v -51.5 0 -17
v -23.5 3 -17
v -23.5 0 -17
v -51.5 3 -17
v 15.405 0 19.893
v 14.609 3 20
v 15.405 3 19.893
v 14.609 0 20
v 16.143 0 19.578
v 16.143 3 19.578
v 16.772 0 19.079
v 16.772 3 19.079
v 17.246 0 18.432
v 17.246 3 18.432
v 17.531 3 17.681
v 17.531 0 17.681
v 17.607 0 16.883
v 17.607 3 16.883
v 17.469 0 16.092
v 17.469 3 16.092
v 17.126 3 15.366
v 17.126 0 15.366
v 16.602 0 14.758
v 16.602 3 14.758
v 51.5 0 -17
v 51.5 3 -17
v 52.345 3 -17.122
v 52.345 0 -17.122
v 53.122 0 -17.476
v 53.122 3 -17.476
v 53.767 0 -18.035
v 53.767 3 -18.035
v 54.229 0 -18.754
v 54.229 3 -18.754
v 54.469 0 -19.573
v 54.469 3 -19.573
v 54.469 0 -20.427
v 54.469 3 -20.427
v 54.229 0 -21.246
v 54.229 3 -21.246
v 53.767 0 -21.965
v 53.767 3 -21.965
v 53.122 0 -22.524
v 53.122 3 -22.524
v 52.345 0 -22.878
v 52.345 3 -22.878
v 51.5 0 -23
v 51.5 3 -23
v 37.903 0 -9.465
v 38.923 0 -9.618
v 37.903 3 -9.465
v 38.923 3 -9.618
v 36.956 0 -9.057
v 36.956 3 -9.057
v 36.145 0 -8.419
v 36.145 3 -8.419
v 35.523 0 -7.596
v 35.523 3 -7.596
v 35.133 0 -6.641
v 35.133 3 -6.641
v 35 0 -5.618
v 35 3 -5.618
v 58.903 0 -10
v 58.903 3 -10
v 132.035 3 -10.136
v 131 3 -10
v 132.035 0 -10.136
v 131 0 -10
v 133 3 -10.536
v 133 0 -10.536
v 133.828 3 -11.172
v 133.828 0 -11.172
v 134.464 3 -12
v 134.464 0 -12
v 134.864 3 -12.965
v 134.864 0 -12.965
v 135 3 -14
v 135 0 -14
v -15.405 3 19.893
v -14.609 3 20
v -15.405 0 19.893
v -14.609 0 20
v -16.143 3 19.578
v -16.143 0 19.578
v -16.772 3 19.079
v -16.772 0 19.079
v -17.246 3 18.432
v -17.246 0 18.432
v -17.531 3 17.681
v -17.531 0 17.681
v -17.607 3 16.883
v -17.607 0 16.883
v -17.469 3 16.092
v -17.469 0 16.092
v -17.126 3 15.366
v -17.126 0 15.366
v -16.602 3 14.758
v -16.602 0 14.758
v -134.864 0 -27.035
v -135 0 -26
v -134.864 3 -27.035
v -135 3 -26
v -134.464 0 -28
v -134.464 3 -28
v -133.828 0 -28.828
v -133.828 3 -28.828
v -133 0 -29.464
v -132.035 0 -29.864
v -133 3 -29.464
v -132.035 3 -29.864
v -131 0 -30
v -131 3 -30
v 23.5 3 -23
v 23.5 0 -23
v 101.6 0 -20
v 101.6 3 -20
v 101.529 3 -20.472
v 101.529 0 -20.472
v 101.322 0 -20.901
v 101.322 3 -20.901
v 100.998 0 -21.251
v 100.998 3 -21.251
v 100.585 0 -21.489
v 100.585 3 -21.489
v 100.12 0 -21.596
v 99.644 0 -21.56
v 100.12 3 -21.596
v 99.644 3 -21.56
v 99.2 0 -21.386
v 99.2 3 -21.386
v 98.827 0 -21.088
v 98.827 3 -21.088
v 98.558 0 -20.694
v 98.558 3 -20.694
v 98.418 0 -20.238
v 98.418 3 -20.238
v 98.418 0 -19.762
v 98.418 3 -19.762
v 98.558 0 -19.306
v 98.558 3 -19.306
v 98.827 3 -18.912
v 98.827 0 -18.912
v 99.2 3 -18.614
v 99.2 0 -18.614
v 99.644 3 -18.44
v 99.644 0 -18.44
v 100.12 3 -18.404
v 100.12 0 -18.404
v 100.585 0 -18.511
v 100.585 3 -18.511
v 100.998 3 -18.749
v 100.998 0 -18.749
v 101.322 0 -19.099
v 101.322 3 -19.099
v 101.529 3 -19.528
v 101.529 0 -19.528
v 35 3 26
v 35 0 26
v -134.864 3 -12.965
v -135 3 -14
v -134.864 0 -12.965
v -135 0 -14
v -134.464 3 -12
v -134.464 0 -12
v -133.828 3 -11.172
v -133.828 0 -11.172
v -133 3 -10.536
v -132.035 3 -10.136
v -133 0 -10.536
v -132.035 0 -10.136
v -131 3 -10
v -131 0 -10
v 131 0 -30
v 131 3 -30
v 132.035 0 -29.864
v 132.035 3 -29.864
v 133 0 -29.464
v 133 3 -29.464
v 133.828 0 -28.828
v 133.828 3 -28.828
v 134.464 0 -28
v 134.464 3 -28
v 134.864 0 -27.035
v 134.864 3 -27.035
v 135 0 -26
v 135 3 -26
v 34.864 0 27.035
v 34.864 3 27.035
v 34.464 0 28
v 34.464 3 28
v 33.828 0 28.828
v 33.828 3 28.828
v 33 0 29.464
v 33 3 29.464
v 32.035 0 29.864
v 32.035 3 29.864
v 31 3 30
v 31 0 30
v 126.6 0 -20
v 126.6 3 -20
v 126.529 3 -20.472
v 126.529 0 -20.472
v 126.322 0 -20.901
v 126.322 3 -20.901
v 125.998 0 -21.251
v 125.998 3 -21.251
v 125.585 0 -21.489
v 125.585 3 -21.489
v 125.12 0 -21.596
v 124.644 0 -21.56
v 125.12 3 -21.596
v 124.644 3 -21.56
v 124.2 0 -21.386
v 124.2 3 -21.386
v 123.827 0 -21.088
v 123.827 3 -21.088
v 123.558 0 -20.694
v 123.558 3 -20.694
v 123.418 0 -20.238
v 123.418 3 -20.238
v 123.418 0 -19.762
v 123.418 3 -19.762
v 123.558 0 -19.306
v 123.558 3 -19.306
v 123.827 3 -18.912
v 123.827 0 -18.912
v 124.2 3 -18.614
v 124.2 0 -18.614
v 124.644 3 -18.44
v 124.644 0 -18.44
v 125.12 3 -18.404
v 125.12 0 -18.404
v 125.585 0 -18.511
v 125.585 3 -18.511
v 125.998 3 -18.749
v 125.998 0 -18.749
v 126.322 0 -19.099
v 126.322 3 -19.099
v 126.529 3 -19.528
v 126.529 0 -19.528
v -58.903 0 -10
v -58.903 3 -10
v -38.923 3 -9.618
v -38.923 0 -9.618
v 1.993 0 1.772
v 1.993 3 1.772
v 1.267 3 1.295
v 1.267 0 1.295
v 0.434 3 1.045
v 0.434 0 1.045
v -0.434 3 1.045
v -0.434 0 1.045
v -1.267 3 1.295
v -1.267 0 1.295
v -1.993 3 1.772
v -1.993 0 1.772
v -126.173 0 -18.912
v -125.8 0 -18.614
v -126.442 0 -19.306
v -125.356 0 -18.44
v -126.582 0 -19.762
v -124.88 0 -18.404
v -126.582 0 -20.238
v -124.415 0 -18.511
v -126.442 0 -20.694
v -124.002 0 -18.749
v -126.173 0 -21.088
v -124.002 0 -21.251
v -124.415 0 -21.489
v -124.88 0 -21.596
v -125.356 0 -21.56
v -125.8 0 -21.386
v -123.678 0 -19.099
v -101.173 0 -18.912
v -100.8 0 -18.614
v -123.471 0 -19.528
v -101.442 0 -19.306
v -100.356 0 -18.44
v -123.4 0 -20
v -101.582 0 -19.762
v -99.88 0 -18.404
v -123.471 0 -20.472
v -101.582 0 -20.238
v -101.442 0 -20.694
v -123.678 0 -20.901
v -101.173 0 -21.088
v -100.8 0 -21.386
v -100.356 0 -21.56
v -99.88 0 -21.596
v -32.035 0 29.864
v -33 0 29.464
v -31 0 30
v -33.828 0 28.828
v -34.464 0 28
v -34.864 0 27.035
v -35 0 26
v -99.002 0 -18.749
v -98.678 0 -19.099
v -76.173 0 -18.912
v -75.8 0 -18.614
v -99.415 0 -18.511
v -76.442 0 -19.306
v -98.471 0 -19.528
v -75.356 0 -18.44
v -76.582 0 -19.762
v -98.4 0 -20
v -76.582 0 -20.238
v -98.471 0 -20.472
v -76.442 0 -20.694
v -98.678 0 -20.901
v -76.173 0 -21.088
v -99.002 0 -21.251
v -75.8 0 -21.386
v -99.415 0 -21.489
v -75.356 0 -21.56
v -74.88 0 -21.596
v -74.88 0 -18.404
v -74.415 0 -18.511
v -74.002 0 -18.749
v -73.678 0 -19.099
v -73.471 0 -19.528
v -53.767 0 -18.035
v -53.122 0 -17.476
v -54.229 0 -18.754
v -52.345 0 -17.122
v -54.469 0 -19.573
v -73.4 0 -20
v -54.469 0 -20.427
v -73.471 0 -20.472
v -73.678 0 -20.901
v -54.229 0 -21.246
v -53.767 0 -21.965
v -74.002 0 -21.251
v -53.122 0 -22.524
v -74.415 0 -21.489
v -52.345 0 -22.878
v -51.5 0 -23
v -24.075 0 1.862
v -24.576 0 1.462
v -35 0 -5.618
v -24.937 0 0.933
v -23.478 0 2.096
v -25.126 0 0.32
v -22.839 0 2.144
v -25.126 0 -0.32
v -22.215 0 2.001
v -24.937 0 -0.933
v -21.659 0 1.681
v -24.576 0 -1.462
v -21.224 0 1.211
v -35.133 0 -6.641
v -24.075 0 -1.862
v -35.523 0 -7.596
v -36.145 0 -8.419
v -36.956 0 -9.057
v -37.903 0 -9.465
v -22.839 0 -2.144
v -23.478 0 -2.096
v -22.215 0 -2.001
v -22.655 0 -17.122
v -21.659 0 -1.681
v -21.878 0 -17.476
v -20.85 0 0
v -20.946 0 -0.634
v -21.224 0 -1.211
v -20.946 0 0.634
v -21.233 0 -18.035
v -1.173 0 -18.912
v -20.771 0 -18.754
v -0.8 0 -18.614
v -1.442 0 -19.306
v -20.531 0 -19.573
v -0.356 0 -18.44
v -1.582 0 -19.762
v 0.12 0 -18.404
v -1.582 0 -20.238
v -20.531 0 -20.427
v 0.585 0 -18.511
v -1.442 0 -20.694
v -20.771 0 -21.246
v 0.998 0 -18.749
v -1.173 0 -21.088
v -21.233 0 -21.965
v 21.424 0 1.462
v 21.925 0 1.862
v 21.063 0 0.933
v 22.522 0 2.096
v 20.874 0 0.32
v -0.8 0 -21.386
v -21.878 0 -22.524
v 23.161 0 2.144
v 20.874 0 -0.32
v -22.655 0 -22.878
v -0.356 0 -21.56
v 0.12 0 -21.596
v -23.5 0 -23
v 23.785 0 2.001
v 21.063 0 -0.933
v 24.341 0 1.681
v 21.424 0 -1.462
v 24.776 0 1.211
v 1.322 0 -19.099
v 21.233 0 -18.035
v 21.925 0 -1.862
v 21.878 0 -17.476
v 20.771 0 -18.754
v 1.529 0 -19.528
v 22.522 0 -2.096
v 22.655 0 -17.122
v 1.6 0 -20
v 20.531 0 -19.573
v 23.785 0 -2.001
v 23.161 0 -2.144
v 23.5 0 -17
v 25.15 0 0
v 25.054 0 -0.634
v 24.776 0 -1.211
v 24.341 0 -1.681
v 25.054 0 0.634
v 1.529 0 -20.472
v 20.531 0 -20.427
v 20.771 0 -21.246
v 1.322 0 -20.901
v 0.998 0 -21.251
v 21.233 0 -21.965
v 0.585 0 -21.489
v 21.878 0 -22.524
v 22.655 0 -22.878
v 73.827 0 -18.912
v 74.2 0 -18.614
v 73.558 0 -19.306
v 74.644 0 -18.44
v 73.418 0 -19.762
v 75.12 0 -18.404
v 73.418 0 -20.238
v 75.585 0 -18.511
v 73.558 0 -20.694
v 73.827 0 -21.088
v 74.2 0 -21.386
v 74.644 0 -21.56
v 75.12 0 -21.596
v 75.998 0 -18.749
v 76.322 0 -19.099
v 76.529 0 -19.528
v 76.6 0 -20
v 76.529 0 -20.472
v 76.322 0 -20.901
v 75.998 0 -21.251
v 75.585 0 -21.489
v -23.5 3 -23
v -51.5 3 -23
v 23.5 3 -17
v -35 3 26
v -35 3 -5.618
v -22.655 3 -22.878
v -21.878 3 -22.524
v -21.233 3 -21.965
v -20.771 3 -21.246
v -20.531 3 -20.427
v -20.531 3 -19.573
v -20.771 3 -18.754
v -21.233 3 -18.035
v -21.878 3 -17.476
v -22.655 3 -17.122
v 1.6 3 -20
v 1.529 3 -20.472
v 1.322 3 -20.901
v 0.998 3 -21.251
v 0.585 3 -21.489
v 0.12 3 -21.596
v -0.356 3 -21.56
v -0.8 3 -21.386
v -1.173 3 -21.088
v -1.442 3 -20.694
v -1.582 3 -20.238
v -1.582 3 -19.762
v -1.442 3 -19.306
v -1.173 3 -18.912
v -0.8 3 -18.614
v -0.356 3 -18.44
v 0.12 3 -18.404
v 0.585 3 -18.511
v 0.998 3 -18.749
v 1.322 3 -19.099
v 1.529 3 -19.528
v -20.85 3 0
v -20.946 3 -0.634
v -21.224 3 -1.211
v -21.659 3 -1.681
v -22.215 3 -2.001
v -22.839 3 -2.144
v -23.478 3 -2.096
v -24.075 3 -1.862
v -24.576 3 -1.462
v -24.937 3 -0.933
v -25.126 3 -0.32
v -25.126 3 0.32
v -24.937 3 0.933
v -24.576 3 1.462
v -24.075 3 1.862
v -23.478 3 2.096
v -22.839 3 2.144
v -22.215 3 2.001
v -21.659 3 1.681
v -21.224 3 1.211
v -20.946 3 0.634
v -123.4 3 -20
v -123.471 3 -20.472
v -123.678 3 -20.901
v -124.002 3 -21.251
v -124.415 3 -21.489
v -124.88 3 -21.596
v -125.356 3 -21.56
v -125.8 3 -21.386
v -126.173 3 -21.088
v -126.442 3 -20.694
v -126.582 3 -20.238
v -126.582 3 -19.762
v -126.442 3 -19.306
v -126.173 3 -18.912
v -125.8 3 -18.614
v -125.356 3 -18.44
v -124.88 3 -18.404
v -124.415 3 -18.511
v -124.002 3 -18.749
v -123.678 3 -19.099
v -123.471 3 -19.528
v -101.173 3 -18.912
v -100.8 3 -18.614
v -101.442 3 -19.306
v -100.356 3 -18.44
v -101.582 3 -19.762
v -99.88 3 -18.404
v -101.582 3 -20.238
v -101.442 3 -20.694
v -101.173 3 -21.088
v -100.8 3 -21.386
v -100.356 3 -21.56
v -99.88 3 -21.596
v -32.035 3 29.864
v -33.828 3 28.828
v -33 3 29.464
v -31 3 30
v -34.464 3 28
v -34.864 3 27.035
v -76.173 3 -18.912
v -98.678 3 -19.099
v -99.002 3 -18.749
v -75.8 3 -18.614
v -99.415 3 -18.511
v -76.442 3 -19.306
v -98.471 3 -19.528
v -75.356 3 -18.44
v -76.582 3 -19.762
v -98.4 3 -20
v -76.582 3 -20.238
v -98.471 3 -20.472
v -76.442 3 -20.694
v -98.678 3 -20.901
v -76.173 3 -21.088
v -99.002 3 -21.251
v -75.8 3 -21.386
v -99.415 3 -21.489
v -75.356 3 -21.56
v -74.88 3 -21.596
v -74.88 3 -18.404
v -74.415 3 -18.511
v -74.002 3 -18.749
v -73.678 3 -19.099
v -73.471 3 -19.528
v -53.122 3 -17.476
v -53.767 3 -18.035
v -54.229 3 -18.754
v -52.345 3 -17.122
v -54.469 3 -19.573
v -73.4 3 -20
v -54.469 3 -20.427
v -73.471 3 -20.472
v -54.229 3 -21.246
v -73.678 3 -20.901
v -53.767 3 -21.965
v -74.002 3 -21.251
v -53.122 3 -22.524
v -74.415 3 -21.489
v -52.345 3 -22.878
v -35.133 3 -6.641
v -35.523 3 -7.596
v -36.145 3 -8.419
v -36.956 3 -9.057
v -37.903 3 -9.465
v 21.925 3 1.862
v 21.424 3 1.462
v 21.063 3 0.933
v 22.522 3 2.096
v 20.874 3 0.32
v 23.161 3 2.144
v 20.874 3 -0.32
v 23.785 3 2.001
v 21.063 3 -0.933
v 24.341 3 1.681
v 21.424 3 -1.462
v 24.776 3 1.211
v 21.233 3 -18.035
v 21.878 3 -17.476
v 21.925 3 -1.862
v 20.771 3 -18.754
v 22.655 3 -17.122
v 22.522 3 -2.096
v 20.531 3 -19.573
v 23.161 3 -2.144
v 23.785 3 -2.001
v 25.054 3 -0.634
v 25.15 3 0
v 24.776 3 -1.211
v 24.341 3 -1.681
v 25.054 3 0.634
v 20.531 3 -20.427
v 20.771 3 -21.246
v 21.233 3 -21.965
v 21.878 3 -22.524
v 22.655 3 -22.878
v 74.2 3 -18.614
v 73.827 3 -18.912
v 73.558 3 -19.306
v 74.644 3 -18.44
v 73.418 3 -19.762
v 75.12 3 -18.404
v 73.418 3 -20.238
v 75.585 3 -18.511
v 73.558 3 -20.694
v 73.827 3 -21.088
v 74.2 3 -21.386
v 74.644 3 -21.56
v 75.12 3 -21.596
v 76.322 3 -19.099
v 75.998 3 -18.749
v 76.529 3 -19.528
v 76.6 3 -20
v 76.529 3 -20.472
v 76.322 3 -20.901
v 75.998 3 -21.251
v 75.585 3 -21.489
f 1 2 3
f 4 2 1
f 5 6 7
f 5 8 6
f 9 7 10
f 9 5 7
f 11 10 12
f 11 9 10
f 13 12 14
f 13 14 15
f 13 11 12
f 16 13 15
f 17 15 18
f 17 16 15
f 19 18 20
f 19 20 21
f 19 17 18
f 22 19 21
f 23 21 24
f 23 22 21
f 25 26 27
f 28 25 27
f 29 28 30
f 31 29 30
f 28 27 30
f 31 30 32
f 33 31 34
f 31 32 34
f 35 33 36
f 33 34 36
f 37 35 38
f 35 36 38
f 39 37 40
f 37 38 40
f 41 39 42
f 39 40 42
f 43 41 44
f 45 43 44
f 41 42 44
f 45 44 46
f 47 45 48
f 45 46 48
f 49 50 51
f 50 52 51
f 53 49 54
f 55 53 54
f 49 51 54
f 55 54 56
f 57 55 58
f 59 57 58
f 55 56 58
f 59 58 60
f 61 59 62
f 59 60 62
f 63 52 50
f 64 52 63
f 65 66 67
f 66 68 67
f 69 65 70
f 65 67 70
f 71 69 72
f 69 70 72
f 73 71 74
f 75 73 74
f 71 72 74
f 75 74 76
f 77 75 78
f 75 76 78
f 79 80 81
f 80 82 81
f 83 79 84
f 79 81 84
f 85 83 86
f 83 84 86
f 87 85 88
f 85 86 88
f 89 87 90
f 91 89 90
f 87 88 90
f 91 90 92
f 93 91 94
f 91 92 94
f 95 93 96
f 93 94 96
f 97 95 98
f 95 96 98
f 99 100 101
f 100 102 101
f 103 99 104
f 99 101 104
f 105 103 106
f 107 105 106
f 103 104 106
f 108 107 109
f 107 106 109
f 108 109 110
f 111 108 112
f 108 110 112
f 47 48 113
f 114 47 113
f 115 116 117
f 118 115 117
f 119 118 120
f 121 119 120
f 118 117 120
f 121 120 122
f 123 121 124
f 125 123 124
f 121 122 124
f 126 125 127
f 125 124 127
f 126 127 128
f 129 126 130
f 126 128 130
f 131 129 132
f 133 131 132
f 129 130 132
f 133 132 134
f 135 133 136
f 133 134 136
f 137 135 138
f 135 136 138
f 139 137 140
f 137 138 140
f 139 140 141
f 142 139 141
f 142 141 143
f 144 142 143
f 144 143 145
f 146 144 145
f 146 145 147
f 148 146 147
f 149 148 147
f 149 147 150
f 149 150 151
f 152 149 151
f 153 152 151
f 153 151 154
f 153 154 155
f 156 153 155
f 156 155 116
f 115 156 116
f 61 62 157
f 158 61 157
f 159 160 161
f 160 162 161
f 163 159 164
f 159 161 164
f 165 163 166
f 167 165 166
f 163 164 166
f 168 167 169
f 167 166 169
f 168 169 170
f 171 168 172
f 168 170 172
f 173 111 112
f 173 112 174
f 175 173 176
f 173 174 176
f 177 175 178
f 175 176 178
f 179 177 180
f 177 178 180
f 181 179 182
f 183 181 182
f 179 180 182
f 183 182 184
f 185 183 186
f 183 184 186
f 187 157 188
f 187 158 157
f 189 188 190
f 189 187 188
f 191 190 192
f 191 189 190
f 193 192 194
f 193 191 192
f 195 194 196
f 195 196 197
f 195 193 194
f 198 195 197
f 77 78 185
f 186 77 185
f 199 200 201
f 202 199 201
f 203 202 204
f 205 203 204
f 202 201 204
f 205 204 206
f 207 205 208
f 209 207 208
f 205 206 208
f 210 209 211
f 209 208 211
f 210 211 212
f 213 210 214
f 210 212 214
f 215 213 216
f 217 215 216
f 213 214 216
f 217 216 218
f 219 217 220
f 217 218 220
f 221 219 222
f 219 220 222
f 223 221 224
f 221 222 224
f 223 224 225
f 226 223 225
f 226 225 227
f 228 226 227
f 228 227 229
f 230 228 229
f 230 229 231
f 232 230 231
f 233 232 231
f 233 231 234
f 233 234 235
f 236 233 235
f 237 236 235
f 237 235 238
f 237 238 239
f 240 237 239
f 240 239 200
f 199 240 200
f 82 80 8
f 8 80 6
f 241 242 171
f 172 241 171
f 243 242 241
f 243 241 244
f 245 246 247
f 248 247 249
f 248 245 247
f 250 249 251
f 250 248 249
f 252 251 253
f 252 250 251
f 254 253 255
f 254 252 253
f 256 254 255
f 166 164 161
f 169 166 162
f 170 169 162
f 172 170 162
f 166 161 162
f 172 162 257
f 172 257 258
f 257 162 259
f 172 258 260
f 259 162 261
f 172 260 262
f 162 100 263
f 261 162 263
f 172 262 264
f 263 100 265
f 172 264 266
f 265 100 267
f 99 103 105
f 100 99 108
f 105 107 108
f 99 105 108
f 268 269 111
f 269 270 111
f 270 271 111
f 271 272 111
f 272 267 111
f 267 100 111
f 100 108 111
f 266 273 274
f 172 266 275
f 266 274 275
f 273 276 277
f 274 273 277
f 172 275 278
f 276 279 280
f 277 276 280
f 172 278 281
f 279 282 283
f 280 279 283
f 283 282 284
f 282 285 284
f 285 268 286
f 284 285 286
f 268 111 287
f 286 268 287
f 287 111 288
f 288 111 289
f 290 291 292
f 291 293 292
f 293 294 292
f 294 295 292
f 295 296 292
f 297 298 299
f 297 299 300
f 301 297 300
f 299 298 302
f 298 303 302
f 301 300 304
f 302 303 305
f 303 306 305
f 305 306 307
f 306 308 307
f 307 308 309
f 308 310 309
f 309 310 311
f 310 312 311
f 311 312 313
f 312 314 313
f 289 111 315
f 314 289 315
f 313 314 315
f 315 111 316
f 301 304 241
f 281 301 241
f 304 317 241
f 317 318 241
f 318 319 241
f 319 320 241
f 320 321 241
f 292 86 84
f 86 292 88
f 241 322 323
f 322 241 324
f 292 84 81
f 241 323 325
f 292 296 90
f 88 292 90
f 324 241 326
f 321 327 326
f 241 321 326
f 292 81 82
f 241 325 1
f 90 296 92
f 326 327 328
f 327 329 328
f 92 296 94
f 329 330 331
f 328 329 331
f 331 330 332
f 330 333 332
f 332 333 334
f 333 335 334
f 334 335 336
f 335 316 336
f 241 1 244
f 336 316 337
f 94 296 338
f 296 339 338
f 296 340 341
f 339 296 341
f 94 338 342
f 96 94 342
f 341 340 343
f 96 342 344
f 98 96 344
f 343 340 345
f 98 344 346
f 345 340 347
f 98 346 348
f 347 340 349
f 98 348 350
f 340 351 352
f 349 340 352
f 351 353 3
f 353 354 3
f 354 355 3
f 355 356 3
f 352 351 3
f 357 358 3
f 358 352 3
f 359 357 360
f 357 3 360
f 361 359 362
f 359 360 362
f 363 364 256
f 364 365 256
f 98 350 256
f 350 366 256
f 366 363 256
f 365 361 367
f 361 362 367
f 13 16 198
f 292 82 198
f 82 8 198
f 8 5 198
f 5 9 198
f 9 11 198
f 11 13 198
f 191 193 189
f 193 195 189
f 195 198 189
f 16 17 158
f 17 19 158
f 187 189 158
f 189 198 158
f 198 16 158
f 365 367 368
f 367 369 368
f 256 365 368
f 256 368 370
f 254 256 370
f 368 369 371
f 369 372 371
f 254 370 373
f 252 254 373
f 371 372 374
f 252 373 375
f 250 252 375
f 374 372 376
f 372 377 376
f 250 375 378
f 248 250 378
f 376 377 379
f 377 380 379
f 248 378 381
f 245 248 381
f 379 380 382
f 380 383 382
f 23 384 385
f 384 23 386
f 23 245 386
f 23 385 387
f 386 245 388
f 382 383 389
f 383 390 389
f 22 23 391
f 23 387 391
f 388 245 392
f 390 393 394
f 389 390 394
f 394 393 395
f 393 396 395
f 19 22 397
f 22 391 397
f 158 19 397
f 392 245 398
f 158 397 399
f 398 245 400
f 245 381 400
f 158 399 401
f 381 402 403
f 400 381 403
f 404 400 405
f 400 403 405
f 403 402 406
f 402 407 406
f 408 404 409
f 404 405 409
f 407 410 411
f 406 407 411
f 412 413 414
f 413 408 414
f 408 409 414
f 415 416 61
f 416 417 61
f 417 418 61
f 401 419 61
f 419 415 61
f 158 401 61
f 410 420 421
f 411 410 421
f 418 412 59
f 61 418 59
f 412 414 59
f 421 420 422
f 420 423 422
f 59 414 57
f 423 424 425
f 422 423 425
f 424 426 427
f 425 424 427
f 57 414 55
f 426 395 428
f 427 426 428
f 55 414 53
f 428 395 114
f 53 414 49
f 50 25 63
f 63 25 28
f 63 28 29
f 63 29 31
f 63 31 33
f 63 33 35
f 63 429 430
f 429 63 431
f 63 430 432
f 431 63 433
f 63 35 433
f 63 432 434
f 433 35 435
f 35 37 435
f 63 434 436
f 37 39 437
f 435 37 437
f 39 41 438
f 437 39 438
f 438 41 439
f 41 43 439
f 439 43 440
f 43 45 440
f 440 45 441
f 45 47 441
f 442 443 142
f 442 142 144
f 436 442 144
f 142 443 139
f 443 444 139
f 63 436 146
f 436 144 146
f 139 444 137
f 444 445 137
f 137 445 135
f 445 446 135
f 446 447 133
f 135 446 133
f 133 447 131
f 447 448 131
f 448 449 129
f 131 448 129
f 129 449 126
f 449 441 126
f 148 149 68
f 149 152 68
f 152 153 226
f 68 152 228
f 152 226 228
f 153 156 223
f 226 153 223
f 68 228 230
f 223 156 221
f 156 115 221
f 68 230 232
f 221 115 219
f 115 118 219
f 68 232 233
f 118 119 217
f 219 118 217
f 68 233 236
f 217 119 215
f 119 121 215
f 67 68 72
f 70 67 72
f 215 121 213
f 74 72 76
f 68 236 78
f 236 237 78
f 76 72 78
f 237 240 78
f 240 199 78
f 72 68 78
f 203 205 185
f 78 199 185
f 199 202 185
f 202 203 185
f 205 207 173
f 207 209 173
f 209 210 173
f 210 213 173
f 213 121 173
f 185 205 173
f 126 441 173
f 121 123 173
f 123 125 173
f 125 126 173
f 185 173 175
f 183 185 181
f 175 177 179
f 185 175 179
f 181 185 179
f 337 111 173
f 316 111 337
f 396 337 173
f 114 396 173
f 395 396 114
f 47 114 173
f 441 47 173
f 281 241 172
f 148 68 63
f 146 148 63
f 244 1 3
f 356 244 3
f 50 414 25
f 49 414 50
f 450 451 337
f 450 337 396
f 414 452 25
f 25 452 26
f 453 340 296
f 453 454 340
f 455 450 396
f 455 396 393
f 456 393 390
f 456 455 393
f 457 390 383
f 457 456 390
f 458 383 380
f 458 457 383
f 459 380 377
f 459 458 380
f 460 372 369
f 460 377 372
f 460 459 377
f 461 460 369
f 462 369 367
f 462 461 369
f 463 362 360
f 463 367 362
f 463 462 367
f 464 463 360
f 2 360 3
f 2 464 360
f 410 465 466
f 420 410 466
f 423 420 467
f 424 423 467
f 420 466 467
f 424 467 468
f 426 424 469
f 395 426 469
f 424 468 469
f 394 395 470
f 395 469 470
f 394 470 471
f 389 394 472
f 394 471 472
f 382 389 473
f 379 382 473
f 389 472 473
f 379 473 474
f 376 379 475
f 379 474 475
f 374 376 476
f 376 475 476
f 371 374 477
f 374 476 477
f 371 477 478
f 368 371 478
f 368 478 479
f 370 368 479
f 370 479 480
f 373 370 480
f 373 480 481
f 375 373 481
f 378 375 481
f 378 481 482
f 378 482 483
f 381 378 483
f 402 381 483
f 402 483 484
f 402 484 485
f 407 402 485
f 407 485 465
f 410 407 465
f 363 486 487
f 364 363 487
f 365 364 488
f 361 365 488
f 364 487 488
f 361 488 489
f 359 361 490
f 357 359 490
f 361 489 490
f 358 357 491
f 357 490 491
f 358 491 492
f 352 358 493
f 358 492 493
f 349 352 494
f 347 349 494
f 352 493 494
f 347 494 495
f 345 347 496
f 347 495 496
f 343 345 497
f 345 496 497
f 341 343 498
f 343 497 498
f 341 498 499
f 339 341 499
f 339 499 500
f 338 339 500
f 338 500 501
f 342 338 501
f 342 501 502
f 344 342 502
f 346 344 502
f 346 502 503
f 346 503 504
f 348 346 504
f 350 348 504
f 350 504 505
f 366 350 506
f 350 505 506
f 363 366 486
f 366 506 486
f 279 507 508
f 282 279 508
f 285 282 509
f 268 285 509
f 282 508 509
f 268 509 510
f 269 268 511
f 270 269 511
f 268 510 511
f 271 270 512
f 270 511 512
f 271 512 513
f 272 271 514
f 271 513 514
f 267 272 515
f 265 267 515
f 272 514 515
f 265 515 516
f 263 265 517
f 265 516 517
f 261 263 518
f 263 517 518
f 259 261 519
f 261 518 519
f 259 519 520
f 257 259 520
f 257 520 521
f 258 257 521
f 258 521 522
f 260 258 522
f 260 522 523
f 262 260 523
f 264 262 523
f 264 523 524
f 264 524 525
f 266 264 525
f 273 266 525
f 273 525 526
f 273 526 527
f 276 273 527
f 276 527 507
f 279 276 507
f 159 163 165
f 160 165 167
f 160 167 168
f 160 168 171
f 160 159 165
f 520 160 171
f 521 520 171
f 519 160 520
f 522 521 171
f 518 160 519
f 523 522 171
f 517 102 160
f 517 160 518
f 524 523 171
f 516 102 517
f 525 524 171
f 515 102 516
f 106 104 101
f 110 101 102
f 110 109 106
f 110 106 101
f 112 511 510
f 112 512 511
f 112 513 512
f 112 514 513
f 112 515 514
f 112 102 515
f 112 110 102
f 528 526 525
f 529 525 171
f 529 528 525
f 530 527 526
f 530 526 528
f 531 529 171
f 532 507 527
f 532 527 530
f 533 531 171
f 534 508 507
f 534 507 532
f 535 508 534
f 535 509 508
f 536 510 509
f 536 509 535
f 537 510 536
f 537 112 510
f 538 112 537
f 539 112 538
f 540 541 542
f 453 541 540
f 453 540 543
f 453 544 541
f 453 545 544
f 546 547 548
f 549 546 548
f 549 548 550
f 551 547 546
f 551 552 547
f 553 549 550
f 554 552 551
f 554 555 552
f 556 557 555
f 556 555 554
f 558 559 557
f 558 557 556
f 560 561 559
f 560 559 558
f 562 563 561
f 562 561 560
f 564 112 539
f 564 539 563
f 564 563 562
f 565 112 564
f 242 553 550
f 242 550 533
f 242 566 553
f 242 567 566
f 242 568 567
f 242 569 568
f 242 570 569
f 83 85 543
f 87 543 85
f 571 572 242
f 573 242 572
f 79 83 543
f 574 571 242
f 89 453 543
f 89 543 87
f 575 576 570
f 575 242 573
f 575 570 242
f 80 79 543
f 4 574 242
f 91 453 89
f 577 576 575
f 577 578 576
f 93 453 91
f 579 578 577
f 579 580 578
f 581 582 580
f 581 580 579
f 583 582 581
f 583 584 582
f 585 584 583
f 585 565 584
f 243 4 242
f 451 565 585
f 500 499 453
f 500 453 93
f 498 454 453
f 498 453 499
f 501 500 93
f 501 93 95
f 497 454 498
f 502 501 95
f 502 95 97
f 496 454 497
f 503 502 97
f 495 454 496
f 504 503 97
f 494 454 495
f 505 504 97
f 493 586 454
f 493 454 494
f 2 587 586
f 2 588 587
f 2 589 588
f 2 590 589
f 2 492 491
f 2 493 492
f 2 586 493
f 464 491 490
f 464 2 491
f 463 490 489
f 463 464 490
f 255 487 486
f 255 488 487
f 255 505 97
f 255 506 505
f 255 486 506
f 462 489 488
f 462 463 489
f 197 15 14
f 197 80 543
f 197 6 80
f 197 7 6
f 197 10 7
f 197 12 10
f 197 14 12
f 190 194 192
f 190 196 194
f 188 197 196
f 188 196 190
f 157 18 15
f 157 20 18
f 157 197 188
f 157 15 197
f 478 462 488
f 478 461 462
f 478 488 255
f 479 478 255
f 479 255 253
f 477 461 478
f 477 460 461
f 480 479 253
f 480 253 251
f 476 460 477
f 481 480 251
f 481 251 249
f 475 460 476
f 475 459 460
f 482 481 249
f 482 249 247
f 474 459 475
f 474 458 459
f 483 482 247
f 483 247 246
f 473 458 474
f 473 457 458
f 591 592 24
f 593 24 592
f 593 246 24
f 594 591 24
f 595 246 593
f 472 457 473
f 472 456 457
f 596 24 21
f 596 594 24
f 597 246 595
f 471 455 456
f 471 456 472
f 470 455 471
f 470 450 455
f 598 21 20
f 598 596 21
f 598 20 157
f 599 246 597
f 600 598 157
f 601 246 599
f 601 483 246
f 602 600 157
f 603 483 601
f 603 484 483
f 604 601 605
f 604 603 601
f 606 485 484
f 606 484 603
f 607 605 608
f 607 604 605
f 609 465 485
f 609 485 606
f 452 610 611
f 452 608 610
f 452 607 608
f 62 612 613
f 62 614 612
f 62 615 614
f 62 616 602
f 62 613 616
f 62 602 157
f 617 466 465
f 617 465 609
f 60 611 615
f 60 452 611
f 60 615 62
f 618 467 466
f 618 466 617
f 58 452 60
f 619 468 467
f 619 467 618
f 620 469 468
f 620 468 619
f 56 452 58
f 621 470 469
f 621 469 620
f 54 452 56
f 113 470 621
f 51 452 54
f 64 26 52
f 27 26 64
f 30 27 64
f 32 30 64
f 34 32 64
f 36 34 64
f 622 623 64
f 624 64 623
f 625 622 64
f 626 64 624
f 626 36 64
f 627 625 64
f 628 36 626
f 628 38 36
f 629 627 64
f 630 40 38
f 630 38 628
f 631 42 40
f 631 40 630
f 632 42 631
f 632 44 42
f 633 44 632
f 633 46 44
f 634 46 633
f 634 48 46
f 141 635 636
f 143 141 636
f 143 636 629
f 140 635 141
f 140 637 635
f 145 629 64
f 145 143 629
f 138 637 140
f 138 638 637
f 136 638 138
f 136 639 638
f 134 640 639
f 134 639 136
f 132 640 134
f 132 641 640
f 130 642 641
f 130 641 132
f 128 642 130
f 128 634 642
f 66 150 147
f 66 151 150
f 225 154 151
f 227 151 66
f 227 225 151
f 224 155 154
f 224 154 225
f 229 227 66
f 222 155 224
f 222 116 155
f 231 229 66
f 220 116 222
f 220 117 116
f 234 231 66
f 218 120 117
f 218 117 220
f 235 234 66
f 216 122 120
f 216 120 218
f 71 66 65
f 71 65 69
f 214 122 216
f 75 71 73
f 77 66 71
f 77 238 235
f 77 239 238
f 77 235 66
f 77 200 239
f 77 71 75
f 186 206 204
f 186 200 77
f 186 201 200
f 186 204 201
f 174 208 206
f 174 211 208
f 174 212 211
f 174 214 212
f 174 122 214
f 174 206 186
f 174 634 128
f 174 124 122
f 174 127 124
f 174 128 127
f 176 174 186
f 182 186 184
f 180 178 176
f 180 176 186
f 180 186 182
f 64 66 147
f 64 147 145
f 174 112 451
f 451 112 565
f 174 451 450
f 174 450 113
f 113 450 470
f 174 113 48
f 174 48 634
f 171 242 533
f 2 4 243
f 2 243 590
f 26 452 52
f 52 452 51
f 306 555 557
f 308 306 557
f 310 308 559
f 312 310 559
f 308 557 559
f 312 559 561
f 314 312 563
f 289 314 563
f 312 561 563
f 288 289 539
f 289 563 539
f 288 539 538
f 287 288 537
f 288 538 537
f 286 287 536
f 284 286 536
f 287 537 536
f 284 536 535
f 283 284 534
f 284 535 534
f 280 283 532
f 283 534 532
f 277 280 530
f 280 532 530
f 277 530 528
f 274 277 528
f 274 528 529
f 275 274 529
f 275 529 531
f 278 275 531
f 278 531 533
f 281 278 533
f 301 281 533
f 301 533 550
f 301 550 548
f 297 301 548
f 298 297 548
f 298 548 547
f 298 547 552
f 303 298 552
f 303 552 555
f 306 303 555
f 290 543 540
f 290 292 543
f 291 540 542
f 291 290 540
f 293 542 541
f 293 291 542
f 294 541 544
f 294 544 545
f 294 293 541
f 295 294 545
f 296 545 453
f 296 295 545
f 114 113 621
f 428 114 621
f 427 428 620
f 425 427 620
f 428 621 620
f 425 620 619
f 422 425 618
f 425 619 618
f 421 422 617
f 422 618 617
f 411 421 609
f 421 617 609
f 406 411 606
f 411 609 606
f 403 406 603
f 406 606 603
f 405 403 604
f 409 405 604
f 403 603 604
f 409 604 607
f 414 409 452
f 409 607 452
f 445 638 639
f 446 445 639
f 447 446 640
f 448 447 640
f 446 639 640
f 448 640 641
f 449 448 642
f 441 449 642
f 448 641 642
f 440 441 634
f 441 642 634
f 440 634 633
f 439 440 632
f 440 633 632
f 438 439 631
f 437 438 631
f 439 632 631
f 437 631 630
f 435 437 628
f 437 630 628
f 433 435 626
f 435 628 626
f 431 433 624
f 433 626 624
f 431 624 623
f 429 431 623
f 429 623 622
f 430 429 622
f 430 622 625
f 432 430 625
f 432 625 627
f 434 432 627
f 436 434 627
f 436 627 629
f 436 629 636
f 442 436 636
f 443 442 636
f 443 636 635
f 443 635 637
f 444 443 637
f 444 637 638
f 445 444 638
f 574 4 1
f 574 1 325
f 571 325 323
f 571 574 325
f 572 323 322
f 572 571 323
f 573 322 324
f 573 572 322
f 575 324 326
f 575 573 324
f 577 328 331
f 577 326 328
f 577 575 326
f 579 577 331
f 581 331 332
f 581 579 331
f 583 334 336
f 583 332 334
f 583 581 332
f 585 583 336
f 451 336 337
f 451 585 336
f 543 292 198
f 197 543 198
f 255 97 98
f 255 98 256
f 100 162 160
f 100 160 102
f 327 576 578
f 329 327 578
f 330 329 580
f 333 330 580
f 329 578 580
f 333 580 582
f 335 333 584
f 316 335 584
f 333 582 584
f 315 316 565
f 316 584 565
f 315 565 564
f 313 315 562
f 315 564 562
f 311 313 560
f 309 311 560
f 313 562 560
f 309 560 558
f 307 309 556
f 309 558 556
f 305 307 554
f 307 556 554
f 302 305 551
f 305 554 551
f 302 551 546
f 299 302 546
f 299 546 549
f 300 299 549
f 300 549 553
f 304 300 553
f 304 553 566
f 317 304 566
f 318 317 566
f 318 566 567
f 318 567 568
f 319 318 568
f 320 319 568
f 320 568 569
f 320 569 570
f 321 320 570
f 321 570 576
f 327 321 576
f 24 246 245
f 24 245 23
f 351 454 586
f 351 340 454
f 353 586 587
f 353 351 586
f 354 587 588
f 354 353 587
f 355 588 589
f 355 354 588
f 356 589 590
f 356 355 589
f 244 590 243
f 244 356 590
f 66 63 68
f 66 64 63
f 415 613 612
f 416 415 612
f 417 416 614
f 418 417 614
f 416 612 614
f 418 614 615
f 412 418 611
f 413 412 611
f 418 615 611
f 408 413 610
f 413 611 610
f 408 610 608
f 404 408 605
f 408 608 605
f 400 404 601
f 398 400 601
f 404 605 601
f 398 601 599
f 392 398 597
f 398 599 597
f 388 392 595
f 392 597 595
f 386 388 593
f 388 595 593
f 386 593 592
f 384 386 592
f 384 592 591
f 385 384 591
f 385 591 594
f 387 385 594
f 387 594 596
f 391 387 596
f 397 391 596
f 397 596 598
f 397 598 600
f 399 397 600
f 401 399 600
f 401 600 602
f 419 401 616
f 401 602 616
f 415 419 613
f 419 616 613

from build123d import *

# Parameters (mm, degrees)
SKETCH_1_W          = 270
SKETCH_1_H          = 60
EXTRUDE_1_DEPTH     = 3
SKETCH_2_R          = 2.15
SKETCH_2_R_2        = 1.6
CUT_EXTRUDE_1_DEPTH = 3
SKETCH_3_R          = 1.6
CUT_EXTRUDE_2_DEPTH = 10
CUT_EXTRUDE_3_DEPTH = 10
FILLET_1_R          = 3
FILLET_2_R          = 4
SKETCH_5_W          = 100
SKETCH_5_H          = 40
CUT_EXTRUDE_4_DEPTH = 10
EXTRUDE_2_DEPTH     = 3
EXTRUDE_9_DEPTH     = 3
EXTRUDE_10_DEPTH    = 3
EXTRUDE_11_DEPTH    = 3
EXTRUDE_13_DEPTH    = 3
EXTRUDE_14_DEPTH    = 3
EXTRUDE_16_DEPTH    = 3
EXTRUDE_17_DEPTH    = 3
EXTRUDE_18_DEPTH    = 3
EXTRUDE_19_DEPTH    = 3
CUT_EXTRUDE_5_DEPTH = 4
FILLET_4_R          = 4


with BuildPart() as part:
    # 草图1 → 凸台-拉伸1 (new body)
    with BuildSketch(Plane(origin=(0, 0, 0), x_dir=(1, 0, 0), z_dir=(0, 1, 0))):
        Rectangle(SKETCH_1_W, SKETCH_1_H)
    extrude(amount=EXTRUDE_1_DEPTH)

    # 草图2 → 切除-拉伸1 (cut)
    with BuildSketch(Plane(origin=(0, 3, 0), x_dir=(1, 0, 0), z_dir=(0, 1, 0))):
        with Locations((-23, 0)):
            Circle(SKETCH_2_R)
        with Locations((23, 0)):
            Circle(SKETCH_2_R)
        with Locations((-125, -20)):
            Circle(SKETCH_2_R_2)
        with Locations((-125, -60)):
            Circle(SKETCH_2_R_2)
        with Locations((125, -60)):
            Circle(SKETCH_2_R_2)
        with Locations((125, -20)):
            Circle(SKETCH_2_R_2)
    extrude(amount=-CUT_EXTRUDE_1_DEPTH, mode=Mode.SUBTRACT)

    # 草图3 → 切除-拉伸2 (cut)
    with BuildSketch(Plane(origin=(0, 3, 0), x_dir=(1, 0, 0), z_dir=(0, 1, 0))):
        with Locations((125, 20)):
            Circle(SKETCH_3_R)
        with Locations((100, 20)):
            Circle(SKETCH_3_R)
        with Locations((75, 20)):
            Circle(SKETCH_3_R)
        with Locations((0, 20)):
            Circle(SKETCH_3_R)
        with Locations((-75, 20)):
            Circle(SKETCH_3_R)
        with Locations((-100, 20)):
            Circle(SKETCH_3_R)
        with Locations((-125, 20)):
            Circle(SKETCH_3_R)
    extrude(amount=-CUT_EXTRUDE_2_DEPTH, mode=Mode.SUBTRACT)

    # 草图4 → 切除-拉伸3 (cut)
    with BuildSketch(Plane(origin=(0, 3, 0), x_dir=(1, 0, 0), z_dir=(0, 1, 0))):
        with BuildLine():
            Line((-112.832473586, 10.419213325), (-112.99590583, 10.347711719))
            ThreePointArc((-112.99590583, 10.347711719), (-119.580786675, 12.924404223), (-117.00409417, 19.509285068))
            Line((-117.00409417, 19.509285068), (-116.840661926, 19.580786675))
            ThreePointArc((-116.840661926, 19.580786675), (-110.255781081, 17.00409417), (-112.832473586, 10.419213325))
        make_face()
        with BuildLine():
            Line((-79.771332565, 7.419213325), (-112.99590583, -7.116537478))
            ThreePointArc((-112.99590583, -7.116537478), (-119.580786675, -4.539844974), (-117.00409417, 2.045035871))
            Line((-117.00409417, 2.045035871), (-83.779520905, 16.580786675))
            ThreePointArc((-83.779520905, 16.580786675), (-77.194640061, 14.00409417), (-79.771332565, 7.419213325))
        make_face()
        with BuildLine():
            Line((-32.99590583, 10.419213325), (-112.99590583, -24.580786675))
            ThreePointArc((-112.99590583, -24.580786675), (-119.580786675, -22.00409417), (-117.00409417, -15.419213325))
            Line((-117.00409417, -15.419213325), (-37.00409417, 19.580786675))
            ThreePointArc((-37.00409417, 19.580786675), (-30.419213325, 17.00409417), (-32.99590583, 10.419213325))
        make_face()
        with BuildLine():
            Line((-32.99590583, -10.045035871), (-66.220479095, -24.580786675))
            ThreePointArc((-66.220479095, -24.580786675), (-72.805359939, -22.00409417), (-70.228667435, -15.419213325))
            Line((-70.228667435, -15.419213325), (-37.00409417, -0.883462522))
            ThreePointArc((-37.00409417, -0.883462522), (-30.419213325, -3.460155026), (-32.99590583, -10.045035871))
        make_face()
        with BuildLine():
            Line((-32.99590583, -24.509285068), (-33.159338074, -24.580786675))
            ThreePointArc((-33.159338074, -24.580786675), (-39.744218919, -22.00409417), (-37.167526414, -15.419213325))
            Line((-37.167526414, -15.419213325), (-37.00409417, -15.347711719))
            ThreePointArc((-37.00409417, -15.347711719), (-30.419213325, -17.924404223), (-32.99590583, -24.509285068))
        make_face()
        with BuildLine():
            Line((32.99590583, -24.509285068), (33.159338074, -24.580786675))
            ThreePointArc((33.159338074, -24.580786675), (39.744218919, -22.00409417), (37.167526414, -15.419213325))
            Line((37.167526414, -15.419213325), (37.00409417, -15.347711719))
            ThreePointArc((37.00409417, -15.347711719), (30.419213325, -17.924404223), (32.99590583, -24.509285068))
        make_face()
        with BuildLine():
            Line((32.99590583, -10.045035871), (66.220479095, -24.580786675))
            ThreePointArc((66.220479095, -24.580786675), (72.805359939, -22.00409417), (70.228667435, -15.419213325))
            Line((70.228667435, -15.419213325), (37.00409417, -0.883462522))
            ThreePointArc((37.00409417, -0.883462522), (30.419213325, -3.460155026), (32.99590583, -10.045035871))
        make_face()
        with BuildLine():
            Line((32.99590583, 10.419213325), (112.99590583, -24.580786675))
            ThreePointArc((112.99590583, -24.580786675), (119.580786675, -22.00409417), (117.00409417, -15.419213325))
            Line((117.00409417, -15.419213325), (37.00409417, 19.580786675))
            ThreePointArc((37.00409417, 19.580786675), (30.419213325, 17.00409417), (32.99590583, 10.419213325))
        make_face()
        with BuildLine():
            Line((79.771332565, 7.419213325), (112.99590583, -7.116537478))
            ThreePointArc((112.99590583, -7.116537478), (119.580786675, -4.539844974), (117.00409417, 2.045035871))
            Line((117.00409417, 2.045035871), (83.779520905, 16.580786675))
            ThreePointArc((83.779520905, 16.580786675), (77.194640061, 14.00409417), (79.771332565, 7.419213325))
        make_face()
        with BuildLine():
            Line((112.832473586, 10.419213325), (112.99590583, 10.347711719))
            ThreePointArc((112.99590583, 10.347711719), (119.580786675, 12.924404223), (117.00409417, 19.509285068))
            Line((117.00409417, 19.509285068), (116.840661926, 19.580786675))
            ThreePointArc((116.840661926, 19.580786675), (110.255781081, 17.00409417), (112.832473586, 10.419213325))
        make_face()
        Polygon((0, -20), (-22.5, -20), (0, 0), (22.5, -20), align=None)
    extrude(amount=-CUT_EXTRUDE_3_DEPTH, mode=Mode.SUBTRACT)

    # 圆角1
    fillet_1_edges = [part.edges().sort_by_distance(p)[0] for p in [
        (22.5, 1.5, 20),
        (-22.5, 1.5, 20),
        (0, 1.5, 0),
    ]]
    fillet(fillet_1_edges, radius=FILLET_1_R)

    # 圆角2
    fillet_2_edges = [part.edges().sort_by_distance(p)[0] for p in [
        (135, 1.5, 30),
        (-135, 1.5, 30),
        (-135, 1.5, -30),
        (135, 1.5, -30),
    ]]
    fillet(fillet_2_edges, radius=FILLET_2_R)

    # 草图5 → 切除-拉伸4 (cut)
    with BuildSketch(Plane(origin=(0, 3, 0), x_dir=(1, 0, 0), z_dir=(0, 1, 0))):
        with Locations((-85, -10)):
            Rectangle(SKETCH_5_W, SKETCH_5_H)
        with Locations((85, -10)):
            Rectangle(SKETCH_5_W, SKETCH_5_H)
    extrude(amount=-CUT_EXTRUDE_4_DEPTH, mode=Mode.SUBTRACT)

    # 草图6 → 凸台-拉伸2 (add)
    with BuildSketch(Plane(origin=(0, 3, 0), x_dir=(1, 0, 0), z_dir=(0, 1, 0))):
        with BuildLine():
            Line((-111.519942965, 10), (-118.153192546, 10))
            ThreePointArc((-118.153192546, 10), (-114.836567756, 21), (-111.519942965, 10))
        make_face()
    extrude(amount=-EXTRUDE_2_DEPTH)

    # 草图7 → 凸台-拉伸9 (add)
    with BuildSketch(Plane(origin=(0, 3, 0), x_dir=(1, 0, 0), z_dir=(0, 1, 0))):
        with BuildLine():
            Line((-98.821319018, 10), (-83.779520905, 16.580786675))
            ThreePointArc((-83.779520905, 16.580786675), (-78.241472851, 15.537113222), (-77.19285104, 10))
            Line((-77.19285104, 10), (-98.821319018, 10))
        make_face()
    extrude(amount=-EXTRUDE_9_DEPTH)

    # 草图8 → 凸台-拉伸10 (add)
    with BuildSketch(Plane(origin=(0, 3, 0), x_dir=(1, 0, 0), z_dir=(0, 1, 0))):
        with BuildLine():
            Line((-58.90303514, 10), (-35, 9.542422126))
            Line((-35, 9.542422126), (-32.99590583, 10.419213325))
            ThreePointArc((-32.99590583, 10.419213325), (-30.419213325, 17.00409417), (-37.00409417, 19.580786675))
            Line((-37.00409417, 19.580786675), (-58.90303514, 10))
        make_face()
    extrude(amount=-EXTRUDE_10_DEPTH)

    # 草图9 → 凸台-拉伸11 (add)
    with BuildSketch(Plane(origin=(0, 3, 0), x_dir=(1, 0, 0), z_dir=(0, 1, 0))):
        with BuildLine():
            Line((-35, -0.464249197), (-35, -10.921827071))
            Line((-35, -10.921827071), (-32.99590583, -10.045035871))
            ThreePointArc((-32.99590583, -10.045035871), (-30.105925349, -4.440514214), (-35, -0.464249197))
        make_face()
    extrude(amount=-EXTRUDE_11_DEPTH)

    # 草图10 → 凸台-拉伸13 (add)
    with BuildSketch(Plane(origin=(0, 3, 0), x_dir=(1, 0, 0), z_dir=(0, 1, 0))):
        with BuildLine():
            Line((-35, -14.928498393), (-35, -24.997328276))
            ThreePointArc((-35, -24.997328276), (-29.965585058, -19.962913335), (-35, -14.928498393))
        make_face()
    extrude(amount=-EXTRUDE_13_DEPTH)

    # 草图11 → 凸台-拉伸14 (add)
    with BuildSketch(Plane(origin=(0, 3, 0), x_dir=(1, 0, 0), z_dir=(0, 1, 0))):
        with BuildLine():
            Line((35, -0.464249197), (35, -10.921827071))
            ThreePointArc((35, -10.921827071), (29.771211063, -5.693038134), (35, -0.464249197))
        make_face()
    extrude(amount=-EXTRUDE_14_DEPTH)

    # 草图12 → 凸台-拉伸16 (add)
    with BuildSketch(Plane(origin=(0, 3, 0), x_dir=(1, 0, 0), z_dir=(0, 1, 0))):
        with BuildLine():
            Line((35, -14.928498393), (35, -24.997328276))
            ThreePointArc((35, -24.997328276), (29.965585058, -19.962913335), (35, -14.928498393))
        make_face()
    extrude(amount=-EXTRUDE_16_DEPTH)

    # 草图13 → 凸台-拉伸17 (add)
    with BuildSketch(Plane(origin=(0, 3, 0), x_dir=(1, 0, 0), z_dir=(0, 1, 0))):
        with BuildLine():
            Line((58.90303514, 10), (37.00409417, 19.580786675))
            ThreePointArc((37.00409417, 19.580786675), (30.419213325, 17.00409417), (32.99590583, 10.419213325))
            Line((32.99590583, 10.419213325), (35, 9.542422126))
            Line((35, 9.542422126), (58.90303514, 10))
        make_face()
    extrude(amount=-EXTRUDE_17_DEPTH)

    # 草图14 → 凸台-拉伸18 (add)
    with BuildSketch(Plane(origin=(0, 3, 0), x_dir=(1, 0, 0), z_dir=(0, 1, 0))):
        with BuildLine():
            Line((98.821319018, 10), (83.779520905, 16.580786675))
            ThreePointArc((83.779520905, 16.580786675), (78.241472851, 15.537113222), (77.19285104, 10))
            Line((77.19285104, 10), (98.821319018, 10))
        make_face()
    extrude(amount=-EXTRUDE_18_DEPTH)

    # 草图15 → 凸台-拉伸19 (add)
    with BuildSketch(Plane(origin=(0, 3, 0), x_dir=(1, 0, 0), z_dir=(0, 1, 0))):
        with BuildLine():
            Line((116.732439942, 10), (112.940695569, 10))
            ThreePointArc((112.940695569, 10), (114.836567756, 20.347366768), (116.732439942, 10))
        make_face()
    extrude(amount=-EXTRUDE_19_DEPTH)

    # 草图16 → 切除-拉伸5 (cut, through all)
    with BuildSketch(Plane(origin=(0, 3, 0), x_dir=(1, 0, 0), z_dir=(0, 1, 0))):
        with BuildLine():
            Line((-23.5, 17), (-51.5, 17))
            ThreePointArc((-51.5, 17), (-54.5, 20), (-51.5, 23))
            Line((-51.5, 23), (-23.5, 23))
            ThreePointArc((-23.5, 23), (-20.5, 20), (-23.5, 17))
        make_face()
        with BuildLine():
            Line((23.5, 17), (51.5, 17))
            ThreePointArc((51.5, 17), (54.5, 20), (51.5, 23))
            Line((51.5, 23), (23.5, 23))
            ThreePointArc((23.5, 23), (20.5, 20), (23.5, 17))
        make_face()
    extrude(amount=-CUT_EXTRUDE_5_DEPTH, mode=Mode.SUBTRACT)

    # 圆角4
    fillet_4_edges = [part.edges().sort_by_distance(p)[0] for p in [
        (35, 1.5, -9.542422126),
        (-135, 1.5, -10),
        (-35, 1.5, -9.542422126),
        (-35, 1.5, 30),
        (35, 1.5, 30),
        (135, 1.5, -10),
    ]]
    fillet(fillet_4_edges, radius=FILLET_4_R)


solid = part.part
